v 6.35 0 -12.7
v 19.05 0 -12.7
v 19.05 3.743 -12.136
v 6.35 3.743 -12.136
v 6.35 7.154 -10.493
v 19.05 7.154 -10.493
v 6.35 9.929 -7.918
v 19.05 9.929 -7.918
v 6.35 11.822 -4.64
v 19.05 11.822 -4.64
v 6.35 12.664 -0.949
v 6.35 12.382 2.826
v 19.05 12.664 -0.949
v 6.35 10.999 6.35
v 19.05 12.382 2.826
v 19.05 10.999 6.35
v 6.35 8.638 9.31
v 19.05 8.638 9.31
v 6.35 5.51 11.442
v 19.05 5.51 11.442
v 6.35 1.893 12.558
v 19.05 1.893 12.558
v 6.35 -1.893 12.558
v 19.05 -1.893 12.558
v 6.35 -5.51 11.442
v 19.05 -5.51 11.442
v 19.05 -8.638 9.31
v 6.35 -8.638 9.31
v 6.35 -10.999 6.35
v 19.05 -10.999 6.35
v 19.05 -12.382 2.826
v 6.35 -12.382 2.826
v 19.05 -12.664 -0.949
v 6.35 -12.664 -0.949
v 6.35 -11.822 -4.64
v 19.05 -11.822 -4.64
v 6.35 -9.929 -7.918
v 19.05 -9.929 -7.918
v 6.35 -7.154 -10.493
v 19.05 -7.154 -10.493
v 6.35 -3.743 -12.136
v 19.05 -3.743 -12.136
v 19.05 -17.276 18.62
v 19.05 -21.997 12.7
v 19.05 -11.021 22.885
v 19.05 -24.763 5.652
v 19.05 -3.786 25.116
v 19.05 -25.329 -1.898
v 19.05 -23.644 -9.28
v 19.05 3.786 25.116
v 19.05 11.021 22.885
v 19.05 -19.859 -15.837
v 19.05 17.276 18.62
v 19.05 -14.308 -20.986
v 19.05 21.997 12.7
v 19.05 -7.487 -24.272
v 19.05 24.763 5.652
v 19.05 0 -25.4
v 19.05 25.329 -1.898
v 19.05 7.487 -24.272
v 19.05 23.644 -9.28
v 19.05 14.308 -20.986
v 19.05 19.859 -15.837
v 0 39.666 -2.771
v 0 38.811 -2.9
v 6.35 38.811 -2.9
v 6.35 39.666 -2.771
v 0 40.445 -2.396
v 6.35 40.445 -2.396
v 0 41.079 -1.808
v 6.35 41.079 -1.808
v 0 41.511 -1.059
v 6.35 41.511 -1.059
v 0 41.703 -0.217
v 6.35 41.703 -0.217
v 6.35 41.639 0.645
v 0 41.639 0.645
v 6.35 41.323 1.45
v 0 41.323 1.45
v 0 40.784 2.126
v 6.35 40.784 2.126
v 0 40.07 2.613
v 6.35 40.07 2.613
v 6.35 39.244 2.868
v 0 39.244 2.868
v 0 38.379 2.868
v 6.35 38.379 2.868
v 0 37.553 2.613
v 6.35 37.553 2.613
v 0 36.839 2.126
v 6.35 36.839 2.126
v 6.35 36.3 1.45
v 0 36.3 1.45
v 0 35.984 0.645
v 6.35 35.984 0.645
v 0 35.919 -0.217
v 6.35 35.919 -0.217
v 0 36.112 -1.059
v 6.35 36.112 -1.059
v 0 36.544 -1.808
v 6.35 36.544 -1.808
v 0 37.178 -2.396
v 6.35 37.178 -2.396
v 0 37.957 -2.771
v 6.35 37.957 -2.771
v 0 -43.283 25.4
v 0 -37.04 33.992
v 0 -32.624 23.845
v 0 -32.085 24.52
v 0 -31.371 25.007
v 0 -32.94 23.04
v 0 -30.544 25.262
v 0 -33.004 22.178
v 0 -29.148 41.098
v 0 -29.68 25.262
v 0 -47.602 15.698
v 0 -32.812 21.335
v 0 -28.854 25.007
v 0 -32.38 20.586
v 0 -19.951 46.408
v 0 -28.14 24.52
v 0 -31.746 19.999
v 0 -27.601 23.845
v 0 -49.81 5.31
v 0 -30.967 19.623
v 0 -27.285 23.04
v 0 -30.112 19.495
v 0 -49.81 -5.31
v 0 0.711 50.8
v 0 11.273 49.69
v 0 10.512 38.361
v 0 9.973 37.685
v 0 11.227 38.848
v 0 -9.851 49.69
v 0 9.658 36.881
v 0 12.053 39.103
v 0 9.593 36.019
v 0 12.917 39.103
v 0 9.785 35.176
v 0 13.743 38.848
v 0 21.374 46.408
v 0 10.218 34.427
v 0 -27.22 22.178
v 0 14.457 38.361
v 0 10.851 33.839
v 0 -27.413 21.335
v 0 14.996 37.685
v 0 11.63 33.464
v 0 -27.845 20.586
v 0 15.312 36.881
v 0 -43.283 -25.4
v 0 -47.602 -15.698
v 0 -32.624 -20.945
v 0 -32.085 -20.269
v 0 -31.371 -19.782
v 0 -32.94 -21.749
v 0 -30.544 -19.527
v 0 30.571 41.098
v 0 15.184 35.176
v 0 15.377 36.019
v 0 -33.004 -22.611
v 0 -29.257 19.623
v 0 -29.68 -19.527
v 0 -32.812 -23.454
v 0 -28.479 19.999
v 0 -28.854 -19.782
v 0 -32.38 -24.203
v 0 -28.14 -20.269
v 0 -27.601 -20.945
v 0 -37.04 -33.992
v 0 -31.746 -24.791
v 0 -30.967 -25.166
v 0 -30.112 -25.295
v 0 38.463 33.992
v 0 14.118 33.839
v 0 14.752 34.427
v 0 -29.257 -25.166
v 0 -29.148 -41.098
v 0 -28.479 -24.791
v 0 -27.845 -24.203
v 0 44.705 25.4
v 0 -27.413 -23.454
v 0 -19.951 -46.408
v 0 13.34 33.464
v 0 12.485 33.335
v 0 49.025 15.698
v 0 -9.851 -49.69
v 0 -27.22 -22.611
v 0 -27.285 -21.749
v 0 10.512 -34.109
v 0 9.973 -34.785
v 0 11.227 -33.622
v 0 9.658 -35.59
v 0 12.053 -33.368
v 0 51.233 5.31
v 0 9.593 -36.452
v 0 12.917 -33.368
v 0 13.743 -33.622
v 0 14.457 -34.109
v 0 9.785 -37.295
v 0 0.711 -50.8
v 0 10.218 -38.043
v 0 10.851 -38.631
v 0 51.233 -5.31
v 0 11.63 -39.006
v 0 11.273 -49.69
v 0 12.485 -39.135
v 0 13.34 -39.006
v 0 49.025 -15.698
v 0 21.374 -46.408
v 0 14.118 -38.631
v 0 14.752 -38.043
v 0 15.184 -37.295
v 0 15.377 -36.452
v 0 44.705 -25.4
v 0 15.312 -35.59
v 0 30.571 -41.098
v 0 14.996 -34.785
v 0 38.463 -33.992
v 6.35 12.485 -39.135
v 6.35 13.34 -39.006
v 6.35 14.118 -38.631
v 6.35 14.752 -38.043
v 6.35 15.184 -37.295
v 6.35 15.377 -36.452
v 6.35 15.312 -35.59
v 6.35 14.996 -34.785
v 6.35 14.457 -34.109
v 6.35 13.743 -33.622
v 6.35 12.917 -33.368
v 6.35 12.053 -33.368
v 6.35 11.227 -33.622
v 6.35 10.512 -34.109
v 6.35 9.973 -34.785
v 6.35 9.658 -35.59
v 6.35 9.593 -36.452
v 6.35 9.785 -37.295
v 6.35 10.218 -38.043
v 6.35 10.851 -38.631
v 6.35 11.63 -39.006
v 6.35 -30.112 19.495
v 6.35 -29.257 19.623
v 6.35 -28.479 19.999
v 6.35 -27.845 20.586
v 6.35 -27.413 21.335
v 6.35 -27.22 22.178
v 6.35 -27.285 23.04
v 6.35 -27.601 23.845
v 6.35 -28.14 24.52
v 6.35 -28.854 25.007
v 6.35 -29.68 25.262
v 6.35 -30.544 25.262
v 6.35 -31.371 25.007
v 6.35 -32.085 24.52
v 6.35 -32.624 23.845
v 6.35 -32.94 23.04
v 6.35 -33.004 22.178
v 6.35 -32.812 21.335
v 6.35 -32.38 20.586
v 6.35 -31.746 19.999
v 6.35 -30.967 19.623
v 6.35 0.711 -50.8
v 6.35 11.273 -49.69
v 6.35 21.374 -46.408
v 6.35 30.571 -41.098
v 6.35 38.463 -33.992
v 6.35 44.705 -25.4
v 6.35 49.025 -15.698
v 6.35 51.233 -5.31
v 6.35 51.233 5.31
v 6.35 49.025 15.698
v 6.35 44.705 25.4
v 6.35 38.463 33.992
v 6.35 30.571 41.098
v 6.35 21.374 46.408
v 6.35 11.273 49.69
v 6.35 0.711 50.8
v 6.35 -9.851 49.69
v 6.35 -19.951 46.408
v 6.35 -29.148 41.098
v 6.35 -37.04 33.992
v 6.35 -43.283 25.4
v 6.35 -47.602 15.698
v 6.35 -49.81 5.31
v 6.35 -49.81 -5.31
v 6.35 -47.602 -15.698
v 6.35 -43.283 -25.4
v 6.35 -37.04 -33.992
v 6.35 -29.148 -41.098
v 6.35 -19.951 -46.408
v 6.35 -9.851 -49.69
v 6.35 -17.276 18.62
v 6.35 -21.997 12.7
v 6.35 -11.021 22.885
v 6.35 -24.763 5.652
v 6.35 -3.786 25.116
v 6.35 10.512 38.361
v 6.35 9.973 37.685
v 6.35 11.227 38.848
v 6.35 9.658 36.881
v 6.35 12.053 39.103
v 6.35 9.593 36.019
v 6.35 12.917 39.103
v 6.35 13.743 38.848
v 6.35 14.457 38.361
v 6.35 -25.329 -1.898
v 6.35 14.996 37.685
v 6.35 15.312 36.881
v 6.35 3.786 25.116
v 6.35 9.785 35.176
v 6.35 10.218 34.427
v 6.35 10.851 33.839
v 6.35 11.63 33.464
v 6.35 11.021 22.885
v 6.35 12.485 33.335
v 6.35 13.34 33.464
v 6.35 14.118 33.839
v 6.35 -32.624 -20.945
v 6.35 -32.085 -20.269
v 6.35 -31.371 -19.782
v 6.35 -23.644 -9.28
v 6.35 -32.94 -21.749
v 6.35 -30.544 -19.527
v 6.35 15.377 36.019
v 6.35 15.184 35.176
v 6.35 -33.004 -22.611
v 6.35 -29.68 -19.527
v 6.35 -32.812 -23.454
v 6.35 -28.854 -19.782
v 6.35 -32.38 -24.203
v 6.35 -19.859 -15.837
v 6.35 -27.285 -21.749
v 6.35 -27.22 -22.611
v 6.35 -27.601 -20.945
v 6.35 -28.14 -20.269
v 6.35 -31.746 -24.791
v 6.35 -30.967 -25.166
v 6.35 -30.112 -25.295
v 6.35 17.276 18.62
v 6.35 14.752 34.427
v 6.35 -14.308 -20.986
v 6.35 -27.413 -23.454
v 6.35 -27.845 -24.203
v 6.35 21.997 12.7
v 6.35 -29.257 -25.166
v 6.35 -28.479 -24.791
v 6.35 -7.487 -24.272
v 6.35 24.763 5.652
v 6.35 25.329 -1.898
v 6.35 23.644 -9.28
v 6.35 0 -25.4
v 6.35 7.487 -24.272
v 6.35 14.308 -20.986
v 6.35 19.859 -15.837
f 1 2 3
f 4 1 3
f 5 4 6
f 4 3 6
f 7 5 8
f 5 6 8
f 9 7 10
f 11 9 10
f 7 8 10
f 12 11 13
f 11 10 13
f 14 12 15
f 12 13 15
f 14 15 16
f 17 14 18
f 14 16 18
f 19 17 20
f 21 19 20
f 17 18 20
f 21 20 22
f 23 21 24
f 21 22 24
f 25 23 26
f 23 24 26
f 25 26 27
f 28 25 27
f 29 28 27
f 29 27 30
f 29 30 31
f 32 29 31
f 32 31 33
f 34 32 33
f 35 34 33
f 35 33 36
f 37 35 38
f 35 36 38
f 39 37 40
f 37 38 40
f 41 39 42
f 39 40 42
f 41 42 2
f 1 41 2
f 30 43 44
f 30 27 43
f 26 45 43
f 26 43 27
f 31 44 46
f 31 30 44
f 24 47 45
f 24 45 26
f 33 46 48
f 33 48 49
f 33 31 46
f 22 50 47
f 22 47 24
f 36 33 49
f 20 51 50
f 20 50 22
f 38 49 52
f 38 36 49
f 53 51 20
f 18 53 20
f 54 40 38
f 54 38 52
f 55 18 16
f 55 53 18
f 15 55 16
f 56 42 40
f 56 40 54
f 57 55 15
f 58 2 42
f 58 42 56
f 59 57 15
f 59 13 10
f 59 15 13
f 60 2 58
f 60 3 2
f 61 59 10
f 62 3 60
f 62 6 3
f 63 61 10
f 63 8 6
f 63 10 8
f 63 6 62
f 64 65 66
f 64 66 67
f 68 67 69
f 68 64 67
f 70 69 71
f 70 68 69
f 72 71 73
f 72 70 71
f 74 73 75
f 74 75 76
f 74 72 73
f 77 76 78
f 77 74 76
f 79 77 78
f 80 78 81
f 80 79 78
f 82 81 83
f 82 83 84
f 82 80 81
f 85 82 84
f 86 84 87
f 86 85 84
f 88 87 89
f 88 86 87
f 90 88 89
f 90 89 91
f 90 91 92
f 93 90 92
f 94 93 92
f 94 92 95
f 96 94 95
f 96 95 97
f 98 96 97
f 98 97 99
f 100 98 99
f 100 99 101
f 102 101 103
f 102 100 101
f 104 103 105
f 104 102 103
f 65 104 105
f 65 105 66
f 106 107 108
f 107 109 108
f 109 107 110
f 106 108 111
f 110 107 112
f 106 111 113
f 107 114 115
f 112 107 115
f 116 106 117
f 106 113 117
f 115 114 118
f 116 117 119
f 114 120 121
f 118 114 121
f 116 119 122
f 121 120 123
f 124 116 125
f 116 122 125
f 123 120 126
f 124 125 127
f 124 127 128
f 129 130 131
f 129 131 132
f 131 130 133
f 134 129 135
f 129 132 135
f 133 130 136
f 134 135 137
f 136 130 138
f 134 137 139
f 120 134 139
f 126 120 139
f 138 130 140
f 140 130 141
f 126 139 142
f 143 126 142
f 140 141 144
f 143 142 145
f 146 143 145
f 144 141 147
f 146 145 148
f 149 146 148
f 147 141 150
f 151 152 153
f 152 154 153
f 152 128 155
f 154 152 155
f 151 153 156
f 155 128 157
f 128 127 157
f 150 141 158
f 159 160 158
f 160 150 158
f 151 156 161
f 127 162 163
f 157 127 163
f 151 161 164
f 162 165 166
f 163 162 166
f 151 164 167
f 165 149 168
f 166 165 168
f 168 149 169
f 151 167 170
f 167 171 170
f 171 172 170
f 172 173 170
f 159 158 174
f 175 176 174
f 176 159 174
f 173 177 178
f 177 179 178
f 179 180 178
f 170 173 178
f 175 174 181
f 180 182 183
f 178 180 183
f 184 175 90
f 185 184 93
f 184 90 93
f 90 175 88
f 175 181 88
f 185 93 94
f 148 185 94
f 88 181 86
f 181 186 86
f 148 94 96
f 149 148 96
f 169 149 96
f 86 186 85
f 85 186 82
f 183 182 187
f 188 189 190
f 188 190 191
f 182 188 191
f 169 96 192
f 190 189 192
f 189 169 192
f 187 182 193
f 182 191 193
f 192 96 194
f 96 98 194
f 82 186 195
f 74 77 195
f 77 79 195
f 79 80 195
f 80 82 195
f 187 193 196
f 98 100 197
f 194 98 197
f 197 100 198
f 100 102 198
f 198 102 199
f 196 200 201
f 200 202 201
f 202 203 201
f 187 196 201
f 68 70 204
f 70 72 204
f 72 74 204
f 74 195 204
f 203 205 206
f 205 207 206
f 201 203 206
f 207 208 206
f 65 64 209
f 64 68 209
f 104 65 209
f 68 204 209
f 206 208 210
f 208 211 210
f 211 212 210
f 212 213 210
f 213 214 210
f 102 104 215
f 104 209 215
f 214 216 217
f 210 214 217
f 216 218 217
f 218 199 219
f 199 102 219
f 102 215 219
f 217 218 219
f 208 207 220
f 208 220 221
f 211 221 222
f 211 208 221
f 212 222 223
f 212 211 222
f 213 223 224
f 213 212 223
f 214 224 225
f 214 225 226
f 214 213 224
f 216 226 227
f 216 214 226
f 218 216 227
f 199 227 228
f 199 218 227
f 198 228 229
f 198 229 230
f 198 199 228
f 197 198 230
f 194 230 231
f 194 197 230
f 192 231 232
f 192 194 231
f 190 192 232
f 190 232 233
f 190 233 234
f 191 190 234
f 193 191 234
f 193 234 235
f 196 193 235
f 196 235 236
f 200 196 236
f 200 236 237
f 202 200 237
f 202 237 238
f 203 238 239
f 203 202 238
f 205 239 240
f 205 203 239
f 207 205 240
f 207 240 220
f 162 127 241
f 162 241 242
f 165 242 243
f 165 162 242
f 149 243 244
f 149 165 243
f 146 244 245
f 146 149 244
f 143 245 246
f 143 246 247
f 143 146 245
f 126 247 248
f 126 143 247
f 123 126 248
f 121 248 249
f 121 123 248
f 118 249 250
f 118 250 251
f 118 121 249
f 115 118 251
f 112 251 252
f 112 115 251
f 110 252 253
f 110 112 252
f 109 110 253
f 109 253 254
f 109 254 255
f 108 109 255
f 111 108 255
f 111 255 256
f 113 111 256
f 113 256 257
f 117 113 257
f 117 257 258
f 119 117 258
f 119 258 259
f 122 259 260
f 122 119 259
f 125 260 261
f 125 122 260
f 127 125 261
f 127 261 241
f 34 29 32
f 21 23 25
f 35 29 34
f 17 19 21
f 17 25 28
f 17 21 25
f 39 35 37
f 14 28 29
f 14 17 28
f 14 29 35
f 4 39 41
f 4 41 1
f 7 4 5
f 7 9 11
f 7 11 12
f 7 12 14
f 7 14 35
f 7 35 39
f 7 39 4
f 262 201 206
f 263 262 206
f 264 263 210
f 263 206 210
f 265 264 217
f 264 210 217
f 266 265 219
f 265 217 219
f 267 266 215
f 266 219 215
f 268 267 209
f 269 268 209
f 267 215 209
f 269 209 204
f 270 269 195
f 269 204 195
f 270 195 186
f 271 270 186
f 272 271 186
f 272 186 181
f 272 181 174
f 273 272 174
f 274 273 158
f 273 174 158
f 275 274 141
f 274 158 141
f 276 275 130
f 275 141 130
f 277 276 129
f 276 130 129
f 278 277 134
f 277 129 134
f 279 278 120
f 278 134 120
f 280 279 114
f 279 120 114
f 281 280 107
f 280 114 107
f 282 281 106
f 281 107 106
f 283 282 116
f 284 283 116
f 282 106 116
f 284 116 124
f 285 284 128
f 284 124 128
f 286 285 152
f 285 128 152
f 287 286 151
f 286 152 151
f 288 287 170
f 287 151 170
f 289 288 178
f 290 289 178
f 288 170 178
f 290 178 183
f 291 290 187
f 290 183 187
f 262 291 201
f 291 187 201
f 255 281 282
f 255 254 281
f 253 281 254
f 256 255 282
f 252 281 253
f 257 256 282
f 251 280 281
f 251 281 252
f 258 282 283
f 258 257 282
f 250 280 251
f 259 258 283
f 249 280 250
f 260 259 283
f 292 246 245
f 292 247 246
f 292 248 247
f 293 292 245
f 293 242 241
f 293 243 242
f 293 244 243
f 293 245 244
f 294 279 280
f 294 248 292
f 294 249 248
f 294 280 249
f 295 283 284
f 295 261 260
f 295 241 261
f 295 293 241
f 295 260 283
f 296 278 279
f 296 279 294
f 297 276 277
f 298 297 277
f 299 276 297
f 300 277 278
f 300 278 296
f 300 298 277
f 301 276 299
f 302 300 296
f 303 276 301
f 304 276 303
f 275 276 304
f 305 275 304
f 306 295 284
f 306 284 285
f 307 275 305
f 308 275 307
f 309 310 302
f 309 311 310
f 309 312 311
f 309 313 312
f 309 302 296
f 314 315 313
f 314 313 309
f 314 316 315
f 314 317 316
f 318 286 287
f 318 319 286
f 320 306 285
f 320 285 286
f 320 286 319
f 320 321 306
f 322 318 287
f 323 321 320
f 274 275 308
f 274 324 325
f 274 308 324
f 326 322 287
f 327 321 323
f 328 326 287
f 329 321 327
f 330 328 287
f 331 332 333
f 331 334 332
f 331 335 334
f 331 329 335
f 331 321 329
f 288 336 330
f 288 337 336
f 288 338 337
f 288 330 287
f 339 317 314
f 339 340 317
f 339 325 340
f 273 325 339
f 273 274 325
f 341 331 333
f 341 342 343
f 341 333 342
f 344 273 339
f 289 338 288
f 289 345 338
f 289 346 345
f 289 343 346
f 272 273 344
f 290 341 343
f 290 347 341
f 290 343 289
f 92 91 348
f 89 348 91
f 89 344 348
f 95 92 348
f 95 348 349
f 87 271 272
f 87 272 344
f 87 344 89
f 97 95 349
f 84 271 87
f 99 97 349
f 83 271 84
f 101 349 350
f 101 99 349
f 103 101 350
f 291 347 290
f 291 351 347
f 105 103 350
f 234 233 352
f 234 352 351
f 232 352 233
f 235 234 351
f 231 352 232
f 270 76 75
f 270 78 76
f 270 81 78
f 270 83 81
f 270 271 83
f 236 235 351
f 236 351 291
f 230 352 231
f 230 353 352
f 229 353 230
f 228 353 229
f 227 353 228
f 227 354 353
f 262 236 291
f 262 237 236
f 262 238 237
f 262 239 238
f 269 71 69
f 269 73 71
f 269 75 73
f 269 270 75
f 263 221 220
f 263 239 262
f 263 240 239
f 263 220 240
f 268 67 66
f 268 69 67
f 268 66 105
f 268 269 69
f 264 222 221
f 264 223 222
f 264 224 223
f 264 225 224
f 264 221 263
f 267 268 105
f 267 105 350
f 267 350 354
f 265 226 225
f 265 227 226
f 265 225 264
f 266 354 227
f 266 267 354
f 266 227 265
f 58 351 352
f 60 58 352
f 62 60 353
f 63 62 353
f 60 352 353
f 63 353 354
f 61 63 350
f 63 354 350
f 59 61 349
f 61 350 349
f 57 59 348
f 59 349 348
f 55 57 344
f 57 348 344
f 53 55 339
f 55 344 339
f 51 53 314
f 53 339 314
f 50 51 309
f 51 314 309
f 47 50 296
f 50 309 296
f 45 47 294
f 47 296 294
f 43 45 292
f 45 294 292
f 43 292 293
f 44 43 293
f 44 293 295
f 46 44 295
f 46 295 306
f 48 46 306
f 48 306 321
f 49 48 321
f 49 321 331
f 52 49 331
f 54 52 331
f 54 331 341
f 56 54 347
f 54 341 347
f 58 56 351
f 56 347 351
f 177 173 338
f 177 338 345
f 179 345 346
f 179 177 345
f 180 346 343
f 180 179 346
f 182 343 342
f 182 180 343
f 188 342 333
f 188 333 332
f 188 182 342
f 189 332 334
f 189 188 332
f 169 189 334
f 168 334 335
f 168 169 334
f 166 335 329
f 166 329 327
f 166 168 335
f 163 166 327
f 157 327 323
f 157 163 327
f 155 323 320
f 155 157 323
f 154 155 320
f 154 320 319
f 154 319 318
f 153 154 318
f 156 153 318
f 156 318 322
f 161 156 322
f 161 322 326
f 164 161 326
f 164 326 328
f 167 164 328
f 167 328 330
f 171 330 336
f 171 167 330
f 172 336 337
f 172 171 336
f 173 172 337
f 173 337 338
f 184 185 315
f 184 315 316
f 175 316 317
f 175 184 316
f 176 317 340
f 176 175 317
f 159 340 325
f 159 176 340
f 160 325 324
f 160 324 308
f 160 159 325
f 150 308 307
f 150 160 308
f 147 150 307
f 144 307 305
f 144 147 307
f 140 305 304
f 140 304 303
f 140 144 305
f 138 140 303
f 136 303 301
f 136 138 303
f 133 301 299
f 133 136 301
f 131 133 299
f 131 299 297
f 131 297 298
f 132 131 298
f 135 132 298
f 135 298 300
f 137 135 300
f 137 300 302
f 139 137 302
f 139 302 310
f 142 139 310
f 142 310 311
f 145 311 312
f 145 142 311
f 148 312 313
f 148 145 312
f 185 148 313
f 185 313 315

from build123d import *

# Parameters (mm, degrees)
SKETCH1_R           = 50.8
SKETCH1_R_2         = 2.9
BOSS_EXTRUDE1_DEPTH = 6.35
SKETCH2_R           = 25.4
BOSS_EXTRUDE2_DEPTH = 12.7
SKETCH3_R           = 12.7
CUT_EXTRUDE1_DEPTH  = 12.7


with BuildPart() as part:
    # Sketch1 → Boss-Extrude1 (new body)
    with BuildSketch(Plane(origin=(0, 0, 0), x_dir=(0, 0, -1), z_dir=(1, 0, 0))):
        with Locations((0, 0.711302035)):
            Circle(SKETCH1_R)
        with Locations((-36.235253271, 12.484849521)):
            Circle(SKETCH1_R_2, mode=Mode.SUBTRACT)
        with Locations((-22.394618112, -30.112245451)):
            Circle(SKETCH1_R_2, mode=Mode.SUBTRACT)
        with Locations((22.394618112, -30.112245451)):
            Circle(SKETCH1_R_2, mode=Mode.SUBTRACT)
        with Locations((36.235253271, 12.484849521)):
            Circle(SKETCH1_R_2, mode=Mode.SUBTRACT)
        with Locations((0, 38.811302035)):
            Circle(SKETCH1_R_2, mode=Mode.SUBTRACT)
    extrude(amount=BOSS_EXTRUDE1_DEPTH)

    # Sketch2 → Boss-Extrude2 (add)
    with BuildSketch(Plane(origin=(6.35, 0, 0), x_dir=(0, 0, -1), z_dir=(1, 0, 0))):
        Circle(SKETCH2_R)
    extrude(amount=BOSS_EXTRUDE2_DEPTH)

    # Sketch3 → Cut-Extrude1 (cut)
    with BuildSketch(Plane(origin=(19.05, 0, 0), x_dir=(0, 0, -1), z_dir=(1, 0, 0))):
        Circle(SKETCH3_R)
    extrude(amount=-CUT_EXTRUDE1_DEPTH, mode=Mode.SUBTRACT)


solid = part.part
